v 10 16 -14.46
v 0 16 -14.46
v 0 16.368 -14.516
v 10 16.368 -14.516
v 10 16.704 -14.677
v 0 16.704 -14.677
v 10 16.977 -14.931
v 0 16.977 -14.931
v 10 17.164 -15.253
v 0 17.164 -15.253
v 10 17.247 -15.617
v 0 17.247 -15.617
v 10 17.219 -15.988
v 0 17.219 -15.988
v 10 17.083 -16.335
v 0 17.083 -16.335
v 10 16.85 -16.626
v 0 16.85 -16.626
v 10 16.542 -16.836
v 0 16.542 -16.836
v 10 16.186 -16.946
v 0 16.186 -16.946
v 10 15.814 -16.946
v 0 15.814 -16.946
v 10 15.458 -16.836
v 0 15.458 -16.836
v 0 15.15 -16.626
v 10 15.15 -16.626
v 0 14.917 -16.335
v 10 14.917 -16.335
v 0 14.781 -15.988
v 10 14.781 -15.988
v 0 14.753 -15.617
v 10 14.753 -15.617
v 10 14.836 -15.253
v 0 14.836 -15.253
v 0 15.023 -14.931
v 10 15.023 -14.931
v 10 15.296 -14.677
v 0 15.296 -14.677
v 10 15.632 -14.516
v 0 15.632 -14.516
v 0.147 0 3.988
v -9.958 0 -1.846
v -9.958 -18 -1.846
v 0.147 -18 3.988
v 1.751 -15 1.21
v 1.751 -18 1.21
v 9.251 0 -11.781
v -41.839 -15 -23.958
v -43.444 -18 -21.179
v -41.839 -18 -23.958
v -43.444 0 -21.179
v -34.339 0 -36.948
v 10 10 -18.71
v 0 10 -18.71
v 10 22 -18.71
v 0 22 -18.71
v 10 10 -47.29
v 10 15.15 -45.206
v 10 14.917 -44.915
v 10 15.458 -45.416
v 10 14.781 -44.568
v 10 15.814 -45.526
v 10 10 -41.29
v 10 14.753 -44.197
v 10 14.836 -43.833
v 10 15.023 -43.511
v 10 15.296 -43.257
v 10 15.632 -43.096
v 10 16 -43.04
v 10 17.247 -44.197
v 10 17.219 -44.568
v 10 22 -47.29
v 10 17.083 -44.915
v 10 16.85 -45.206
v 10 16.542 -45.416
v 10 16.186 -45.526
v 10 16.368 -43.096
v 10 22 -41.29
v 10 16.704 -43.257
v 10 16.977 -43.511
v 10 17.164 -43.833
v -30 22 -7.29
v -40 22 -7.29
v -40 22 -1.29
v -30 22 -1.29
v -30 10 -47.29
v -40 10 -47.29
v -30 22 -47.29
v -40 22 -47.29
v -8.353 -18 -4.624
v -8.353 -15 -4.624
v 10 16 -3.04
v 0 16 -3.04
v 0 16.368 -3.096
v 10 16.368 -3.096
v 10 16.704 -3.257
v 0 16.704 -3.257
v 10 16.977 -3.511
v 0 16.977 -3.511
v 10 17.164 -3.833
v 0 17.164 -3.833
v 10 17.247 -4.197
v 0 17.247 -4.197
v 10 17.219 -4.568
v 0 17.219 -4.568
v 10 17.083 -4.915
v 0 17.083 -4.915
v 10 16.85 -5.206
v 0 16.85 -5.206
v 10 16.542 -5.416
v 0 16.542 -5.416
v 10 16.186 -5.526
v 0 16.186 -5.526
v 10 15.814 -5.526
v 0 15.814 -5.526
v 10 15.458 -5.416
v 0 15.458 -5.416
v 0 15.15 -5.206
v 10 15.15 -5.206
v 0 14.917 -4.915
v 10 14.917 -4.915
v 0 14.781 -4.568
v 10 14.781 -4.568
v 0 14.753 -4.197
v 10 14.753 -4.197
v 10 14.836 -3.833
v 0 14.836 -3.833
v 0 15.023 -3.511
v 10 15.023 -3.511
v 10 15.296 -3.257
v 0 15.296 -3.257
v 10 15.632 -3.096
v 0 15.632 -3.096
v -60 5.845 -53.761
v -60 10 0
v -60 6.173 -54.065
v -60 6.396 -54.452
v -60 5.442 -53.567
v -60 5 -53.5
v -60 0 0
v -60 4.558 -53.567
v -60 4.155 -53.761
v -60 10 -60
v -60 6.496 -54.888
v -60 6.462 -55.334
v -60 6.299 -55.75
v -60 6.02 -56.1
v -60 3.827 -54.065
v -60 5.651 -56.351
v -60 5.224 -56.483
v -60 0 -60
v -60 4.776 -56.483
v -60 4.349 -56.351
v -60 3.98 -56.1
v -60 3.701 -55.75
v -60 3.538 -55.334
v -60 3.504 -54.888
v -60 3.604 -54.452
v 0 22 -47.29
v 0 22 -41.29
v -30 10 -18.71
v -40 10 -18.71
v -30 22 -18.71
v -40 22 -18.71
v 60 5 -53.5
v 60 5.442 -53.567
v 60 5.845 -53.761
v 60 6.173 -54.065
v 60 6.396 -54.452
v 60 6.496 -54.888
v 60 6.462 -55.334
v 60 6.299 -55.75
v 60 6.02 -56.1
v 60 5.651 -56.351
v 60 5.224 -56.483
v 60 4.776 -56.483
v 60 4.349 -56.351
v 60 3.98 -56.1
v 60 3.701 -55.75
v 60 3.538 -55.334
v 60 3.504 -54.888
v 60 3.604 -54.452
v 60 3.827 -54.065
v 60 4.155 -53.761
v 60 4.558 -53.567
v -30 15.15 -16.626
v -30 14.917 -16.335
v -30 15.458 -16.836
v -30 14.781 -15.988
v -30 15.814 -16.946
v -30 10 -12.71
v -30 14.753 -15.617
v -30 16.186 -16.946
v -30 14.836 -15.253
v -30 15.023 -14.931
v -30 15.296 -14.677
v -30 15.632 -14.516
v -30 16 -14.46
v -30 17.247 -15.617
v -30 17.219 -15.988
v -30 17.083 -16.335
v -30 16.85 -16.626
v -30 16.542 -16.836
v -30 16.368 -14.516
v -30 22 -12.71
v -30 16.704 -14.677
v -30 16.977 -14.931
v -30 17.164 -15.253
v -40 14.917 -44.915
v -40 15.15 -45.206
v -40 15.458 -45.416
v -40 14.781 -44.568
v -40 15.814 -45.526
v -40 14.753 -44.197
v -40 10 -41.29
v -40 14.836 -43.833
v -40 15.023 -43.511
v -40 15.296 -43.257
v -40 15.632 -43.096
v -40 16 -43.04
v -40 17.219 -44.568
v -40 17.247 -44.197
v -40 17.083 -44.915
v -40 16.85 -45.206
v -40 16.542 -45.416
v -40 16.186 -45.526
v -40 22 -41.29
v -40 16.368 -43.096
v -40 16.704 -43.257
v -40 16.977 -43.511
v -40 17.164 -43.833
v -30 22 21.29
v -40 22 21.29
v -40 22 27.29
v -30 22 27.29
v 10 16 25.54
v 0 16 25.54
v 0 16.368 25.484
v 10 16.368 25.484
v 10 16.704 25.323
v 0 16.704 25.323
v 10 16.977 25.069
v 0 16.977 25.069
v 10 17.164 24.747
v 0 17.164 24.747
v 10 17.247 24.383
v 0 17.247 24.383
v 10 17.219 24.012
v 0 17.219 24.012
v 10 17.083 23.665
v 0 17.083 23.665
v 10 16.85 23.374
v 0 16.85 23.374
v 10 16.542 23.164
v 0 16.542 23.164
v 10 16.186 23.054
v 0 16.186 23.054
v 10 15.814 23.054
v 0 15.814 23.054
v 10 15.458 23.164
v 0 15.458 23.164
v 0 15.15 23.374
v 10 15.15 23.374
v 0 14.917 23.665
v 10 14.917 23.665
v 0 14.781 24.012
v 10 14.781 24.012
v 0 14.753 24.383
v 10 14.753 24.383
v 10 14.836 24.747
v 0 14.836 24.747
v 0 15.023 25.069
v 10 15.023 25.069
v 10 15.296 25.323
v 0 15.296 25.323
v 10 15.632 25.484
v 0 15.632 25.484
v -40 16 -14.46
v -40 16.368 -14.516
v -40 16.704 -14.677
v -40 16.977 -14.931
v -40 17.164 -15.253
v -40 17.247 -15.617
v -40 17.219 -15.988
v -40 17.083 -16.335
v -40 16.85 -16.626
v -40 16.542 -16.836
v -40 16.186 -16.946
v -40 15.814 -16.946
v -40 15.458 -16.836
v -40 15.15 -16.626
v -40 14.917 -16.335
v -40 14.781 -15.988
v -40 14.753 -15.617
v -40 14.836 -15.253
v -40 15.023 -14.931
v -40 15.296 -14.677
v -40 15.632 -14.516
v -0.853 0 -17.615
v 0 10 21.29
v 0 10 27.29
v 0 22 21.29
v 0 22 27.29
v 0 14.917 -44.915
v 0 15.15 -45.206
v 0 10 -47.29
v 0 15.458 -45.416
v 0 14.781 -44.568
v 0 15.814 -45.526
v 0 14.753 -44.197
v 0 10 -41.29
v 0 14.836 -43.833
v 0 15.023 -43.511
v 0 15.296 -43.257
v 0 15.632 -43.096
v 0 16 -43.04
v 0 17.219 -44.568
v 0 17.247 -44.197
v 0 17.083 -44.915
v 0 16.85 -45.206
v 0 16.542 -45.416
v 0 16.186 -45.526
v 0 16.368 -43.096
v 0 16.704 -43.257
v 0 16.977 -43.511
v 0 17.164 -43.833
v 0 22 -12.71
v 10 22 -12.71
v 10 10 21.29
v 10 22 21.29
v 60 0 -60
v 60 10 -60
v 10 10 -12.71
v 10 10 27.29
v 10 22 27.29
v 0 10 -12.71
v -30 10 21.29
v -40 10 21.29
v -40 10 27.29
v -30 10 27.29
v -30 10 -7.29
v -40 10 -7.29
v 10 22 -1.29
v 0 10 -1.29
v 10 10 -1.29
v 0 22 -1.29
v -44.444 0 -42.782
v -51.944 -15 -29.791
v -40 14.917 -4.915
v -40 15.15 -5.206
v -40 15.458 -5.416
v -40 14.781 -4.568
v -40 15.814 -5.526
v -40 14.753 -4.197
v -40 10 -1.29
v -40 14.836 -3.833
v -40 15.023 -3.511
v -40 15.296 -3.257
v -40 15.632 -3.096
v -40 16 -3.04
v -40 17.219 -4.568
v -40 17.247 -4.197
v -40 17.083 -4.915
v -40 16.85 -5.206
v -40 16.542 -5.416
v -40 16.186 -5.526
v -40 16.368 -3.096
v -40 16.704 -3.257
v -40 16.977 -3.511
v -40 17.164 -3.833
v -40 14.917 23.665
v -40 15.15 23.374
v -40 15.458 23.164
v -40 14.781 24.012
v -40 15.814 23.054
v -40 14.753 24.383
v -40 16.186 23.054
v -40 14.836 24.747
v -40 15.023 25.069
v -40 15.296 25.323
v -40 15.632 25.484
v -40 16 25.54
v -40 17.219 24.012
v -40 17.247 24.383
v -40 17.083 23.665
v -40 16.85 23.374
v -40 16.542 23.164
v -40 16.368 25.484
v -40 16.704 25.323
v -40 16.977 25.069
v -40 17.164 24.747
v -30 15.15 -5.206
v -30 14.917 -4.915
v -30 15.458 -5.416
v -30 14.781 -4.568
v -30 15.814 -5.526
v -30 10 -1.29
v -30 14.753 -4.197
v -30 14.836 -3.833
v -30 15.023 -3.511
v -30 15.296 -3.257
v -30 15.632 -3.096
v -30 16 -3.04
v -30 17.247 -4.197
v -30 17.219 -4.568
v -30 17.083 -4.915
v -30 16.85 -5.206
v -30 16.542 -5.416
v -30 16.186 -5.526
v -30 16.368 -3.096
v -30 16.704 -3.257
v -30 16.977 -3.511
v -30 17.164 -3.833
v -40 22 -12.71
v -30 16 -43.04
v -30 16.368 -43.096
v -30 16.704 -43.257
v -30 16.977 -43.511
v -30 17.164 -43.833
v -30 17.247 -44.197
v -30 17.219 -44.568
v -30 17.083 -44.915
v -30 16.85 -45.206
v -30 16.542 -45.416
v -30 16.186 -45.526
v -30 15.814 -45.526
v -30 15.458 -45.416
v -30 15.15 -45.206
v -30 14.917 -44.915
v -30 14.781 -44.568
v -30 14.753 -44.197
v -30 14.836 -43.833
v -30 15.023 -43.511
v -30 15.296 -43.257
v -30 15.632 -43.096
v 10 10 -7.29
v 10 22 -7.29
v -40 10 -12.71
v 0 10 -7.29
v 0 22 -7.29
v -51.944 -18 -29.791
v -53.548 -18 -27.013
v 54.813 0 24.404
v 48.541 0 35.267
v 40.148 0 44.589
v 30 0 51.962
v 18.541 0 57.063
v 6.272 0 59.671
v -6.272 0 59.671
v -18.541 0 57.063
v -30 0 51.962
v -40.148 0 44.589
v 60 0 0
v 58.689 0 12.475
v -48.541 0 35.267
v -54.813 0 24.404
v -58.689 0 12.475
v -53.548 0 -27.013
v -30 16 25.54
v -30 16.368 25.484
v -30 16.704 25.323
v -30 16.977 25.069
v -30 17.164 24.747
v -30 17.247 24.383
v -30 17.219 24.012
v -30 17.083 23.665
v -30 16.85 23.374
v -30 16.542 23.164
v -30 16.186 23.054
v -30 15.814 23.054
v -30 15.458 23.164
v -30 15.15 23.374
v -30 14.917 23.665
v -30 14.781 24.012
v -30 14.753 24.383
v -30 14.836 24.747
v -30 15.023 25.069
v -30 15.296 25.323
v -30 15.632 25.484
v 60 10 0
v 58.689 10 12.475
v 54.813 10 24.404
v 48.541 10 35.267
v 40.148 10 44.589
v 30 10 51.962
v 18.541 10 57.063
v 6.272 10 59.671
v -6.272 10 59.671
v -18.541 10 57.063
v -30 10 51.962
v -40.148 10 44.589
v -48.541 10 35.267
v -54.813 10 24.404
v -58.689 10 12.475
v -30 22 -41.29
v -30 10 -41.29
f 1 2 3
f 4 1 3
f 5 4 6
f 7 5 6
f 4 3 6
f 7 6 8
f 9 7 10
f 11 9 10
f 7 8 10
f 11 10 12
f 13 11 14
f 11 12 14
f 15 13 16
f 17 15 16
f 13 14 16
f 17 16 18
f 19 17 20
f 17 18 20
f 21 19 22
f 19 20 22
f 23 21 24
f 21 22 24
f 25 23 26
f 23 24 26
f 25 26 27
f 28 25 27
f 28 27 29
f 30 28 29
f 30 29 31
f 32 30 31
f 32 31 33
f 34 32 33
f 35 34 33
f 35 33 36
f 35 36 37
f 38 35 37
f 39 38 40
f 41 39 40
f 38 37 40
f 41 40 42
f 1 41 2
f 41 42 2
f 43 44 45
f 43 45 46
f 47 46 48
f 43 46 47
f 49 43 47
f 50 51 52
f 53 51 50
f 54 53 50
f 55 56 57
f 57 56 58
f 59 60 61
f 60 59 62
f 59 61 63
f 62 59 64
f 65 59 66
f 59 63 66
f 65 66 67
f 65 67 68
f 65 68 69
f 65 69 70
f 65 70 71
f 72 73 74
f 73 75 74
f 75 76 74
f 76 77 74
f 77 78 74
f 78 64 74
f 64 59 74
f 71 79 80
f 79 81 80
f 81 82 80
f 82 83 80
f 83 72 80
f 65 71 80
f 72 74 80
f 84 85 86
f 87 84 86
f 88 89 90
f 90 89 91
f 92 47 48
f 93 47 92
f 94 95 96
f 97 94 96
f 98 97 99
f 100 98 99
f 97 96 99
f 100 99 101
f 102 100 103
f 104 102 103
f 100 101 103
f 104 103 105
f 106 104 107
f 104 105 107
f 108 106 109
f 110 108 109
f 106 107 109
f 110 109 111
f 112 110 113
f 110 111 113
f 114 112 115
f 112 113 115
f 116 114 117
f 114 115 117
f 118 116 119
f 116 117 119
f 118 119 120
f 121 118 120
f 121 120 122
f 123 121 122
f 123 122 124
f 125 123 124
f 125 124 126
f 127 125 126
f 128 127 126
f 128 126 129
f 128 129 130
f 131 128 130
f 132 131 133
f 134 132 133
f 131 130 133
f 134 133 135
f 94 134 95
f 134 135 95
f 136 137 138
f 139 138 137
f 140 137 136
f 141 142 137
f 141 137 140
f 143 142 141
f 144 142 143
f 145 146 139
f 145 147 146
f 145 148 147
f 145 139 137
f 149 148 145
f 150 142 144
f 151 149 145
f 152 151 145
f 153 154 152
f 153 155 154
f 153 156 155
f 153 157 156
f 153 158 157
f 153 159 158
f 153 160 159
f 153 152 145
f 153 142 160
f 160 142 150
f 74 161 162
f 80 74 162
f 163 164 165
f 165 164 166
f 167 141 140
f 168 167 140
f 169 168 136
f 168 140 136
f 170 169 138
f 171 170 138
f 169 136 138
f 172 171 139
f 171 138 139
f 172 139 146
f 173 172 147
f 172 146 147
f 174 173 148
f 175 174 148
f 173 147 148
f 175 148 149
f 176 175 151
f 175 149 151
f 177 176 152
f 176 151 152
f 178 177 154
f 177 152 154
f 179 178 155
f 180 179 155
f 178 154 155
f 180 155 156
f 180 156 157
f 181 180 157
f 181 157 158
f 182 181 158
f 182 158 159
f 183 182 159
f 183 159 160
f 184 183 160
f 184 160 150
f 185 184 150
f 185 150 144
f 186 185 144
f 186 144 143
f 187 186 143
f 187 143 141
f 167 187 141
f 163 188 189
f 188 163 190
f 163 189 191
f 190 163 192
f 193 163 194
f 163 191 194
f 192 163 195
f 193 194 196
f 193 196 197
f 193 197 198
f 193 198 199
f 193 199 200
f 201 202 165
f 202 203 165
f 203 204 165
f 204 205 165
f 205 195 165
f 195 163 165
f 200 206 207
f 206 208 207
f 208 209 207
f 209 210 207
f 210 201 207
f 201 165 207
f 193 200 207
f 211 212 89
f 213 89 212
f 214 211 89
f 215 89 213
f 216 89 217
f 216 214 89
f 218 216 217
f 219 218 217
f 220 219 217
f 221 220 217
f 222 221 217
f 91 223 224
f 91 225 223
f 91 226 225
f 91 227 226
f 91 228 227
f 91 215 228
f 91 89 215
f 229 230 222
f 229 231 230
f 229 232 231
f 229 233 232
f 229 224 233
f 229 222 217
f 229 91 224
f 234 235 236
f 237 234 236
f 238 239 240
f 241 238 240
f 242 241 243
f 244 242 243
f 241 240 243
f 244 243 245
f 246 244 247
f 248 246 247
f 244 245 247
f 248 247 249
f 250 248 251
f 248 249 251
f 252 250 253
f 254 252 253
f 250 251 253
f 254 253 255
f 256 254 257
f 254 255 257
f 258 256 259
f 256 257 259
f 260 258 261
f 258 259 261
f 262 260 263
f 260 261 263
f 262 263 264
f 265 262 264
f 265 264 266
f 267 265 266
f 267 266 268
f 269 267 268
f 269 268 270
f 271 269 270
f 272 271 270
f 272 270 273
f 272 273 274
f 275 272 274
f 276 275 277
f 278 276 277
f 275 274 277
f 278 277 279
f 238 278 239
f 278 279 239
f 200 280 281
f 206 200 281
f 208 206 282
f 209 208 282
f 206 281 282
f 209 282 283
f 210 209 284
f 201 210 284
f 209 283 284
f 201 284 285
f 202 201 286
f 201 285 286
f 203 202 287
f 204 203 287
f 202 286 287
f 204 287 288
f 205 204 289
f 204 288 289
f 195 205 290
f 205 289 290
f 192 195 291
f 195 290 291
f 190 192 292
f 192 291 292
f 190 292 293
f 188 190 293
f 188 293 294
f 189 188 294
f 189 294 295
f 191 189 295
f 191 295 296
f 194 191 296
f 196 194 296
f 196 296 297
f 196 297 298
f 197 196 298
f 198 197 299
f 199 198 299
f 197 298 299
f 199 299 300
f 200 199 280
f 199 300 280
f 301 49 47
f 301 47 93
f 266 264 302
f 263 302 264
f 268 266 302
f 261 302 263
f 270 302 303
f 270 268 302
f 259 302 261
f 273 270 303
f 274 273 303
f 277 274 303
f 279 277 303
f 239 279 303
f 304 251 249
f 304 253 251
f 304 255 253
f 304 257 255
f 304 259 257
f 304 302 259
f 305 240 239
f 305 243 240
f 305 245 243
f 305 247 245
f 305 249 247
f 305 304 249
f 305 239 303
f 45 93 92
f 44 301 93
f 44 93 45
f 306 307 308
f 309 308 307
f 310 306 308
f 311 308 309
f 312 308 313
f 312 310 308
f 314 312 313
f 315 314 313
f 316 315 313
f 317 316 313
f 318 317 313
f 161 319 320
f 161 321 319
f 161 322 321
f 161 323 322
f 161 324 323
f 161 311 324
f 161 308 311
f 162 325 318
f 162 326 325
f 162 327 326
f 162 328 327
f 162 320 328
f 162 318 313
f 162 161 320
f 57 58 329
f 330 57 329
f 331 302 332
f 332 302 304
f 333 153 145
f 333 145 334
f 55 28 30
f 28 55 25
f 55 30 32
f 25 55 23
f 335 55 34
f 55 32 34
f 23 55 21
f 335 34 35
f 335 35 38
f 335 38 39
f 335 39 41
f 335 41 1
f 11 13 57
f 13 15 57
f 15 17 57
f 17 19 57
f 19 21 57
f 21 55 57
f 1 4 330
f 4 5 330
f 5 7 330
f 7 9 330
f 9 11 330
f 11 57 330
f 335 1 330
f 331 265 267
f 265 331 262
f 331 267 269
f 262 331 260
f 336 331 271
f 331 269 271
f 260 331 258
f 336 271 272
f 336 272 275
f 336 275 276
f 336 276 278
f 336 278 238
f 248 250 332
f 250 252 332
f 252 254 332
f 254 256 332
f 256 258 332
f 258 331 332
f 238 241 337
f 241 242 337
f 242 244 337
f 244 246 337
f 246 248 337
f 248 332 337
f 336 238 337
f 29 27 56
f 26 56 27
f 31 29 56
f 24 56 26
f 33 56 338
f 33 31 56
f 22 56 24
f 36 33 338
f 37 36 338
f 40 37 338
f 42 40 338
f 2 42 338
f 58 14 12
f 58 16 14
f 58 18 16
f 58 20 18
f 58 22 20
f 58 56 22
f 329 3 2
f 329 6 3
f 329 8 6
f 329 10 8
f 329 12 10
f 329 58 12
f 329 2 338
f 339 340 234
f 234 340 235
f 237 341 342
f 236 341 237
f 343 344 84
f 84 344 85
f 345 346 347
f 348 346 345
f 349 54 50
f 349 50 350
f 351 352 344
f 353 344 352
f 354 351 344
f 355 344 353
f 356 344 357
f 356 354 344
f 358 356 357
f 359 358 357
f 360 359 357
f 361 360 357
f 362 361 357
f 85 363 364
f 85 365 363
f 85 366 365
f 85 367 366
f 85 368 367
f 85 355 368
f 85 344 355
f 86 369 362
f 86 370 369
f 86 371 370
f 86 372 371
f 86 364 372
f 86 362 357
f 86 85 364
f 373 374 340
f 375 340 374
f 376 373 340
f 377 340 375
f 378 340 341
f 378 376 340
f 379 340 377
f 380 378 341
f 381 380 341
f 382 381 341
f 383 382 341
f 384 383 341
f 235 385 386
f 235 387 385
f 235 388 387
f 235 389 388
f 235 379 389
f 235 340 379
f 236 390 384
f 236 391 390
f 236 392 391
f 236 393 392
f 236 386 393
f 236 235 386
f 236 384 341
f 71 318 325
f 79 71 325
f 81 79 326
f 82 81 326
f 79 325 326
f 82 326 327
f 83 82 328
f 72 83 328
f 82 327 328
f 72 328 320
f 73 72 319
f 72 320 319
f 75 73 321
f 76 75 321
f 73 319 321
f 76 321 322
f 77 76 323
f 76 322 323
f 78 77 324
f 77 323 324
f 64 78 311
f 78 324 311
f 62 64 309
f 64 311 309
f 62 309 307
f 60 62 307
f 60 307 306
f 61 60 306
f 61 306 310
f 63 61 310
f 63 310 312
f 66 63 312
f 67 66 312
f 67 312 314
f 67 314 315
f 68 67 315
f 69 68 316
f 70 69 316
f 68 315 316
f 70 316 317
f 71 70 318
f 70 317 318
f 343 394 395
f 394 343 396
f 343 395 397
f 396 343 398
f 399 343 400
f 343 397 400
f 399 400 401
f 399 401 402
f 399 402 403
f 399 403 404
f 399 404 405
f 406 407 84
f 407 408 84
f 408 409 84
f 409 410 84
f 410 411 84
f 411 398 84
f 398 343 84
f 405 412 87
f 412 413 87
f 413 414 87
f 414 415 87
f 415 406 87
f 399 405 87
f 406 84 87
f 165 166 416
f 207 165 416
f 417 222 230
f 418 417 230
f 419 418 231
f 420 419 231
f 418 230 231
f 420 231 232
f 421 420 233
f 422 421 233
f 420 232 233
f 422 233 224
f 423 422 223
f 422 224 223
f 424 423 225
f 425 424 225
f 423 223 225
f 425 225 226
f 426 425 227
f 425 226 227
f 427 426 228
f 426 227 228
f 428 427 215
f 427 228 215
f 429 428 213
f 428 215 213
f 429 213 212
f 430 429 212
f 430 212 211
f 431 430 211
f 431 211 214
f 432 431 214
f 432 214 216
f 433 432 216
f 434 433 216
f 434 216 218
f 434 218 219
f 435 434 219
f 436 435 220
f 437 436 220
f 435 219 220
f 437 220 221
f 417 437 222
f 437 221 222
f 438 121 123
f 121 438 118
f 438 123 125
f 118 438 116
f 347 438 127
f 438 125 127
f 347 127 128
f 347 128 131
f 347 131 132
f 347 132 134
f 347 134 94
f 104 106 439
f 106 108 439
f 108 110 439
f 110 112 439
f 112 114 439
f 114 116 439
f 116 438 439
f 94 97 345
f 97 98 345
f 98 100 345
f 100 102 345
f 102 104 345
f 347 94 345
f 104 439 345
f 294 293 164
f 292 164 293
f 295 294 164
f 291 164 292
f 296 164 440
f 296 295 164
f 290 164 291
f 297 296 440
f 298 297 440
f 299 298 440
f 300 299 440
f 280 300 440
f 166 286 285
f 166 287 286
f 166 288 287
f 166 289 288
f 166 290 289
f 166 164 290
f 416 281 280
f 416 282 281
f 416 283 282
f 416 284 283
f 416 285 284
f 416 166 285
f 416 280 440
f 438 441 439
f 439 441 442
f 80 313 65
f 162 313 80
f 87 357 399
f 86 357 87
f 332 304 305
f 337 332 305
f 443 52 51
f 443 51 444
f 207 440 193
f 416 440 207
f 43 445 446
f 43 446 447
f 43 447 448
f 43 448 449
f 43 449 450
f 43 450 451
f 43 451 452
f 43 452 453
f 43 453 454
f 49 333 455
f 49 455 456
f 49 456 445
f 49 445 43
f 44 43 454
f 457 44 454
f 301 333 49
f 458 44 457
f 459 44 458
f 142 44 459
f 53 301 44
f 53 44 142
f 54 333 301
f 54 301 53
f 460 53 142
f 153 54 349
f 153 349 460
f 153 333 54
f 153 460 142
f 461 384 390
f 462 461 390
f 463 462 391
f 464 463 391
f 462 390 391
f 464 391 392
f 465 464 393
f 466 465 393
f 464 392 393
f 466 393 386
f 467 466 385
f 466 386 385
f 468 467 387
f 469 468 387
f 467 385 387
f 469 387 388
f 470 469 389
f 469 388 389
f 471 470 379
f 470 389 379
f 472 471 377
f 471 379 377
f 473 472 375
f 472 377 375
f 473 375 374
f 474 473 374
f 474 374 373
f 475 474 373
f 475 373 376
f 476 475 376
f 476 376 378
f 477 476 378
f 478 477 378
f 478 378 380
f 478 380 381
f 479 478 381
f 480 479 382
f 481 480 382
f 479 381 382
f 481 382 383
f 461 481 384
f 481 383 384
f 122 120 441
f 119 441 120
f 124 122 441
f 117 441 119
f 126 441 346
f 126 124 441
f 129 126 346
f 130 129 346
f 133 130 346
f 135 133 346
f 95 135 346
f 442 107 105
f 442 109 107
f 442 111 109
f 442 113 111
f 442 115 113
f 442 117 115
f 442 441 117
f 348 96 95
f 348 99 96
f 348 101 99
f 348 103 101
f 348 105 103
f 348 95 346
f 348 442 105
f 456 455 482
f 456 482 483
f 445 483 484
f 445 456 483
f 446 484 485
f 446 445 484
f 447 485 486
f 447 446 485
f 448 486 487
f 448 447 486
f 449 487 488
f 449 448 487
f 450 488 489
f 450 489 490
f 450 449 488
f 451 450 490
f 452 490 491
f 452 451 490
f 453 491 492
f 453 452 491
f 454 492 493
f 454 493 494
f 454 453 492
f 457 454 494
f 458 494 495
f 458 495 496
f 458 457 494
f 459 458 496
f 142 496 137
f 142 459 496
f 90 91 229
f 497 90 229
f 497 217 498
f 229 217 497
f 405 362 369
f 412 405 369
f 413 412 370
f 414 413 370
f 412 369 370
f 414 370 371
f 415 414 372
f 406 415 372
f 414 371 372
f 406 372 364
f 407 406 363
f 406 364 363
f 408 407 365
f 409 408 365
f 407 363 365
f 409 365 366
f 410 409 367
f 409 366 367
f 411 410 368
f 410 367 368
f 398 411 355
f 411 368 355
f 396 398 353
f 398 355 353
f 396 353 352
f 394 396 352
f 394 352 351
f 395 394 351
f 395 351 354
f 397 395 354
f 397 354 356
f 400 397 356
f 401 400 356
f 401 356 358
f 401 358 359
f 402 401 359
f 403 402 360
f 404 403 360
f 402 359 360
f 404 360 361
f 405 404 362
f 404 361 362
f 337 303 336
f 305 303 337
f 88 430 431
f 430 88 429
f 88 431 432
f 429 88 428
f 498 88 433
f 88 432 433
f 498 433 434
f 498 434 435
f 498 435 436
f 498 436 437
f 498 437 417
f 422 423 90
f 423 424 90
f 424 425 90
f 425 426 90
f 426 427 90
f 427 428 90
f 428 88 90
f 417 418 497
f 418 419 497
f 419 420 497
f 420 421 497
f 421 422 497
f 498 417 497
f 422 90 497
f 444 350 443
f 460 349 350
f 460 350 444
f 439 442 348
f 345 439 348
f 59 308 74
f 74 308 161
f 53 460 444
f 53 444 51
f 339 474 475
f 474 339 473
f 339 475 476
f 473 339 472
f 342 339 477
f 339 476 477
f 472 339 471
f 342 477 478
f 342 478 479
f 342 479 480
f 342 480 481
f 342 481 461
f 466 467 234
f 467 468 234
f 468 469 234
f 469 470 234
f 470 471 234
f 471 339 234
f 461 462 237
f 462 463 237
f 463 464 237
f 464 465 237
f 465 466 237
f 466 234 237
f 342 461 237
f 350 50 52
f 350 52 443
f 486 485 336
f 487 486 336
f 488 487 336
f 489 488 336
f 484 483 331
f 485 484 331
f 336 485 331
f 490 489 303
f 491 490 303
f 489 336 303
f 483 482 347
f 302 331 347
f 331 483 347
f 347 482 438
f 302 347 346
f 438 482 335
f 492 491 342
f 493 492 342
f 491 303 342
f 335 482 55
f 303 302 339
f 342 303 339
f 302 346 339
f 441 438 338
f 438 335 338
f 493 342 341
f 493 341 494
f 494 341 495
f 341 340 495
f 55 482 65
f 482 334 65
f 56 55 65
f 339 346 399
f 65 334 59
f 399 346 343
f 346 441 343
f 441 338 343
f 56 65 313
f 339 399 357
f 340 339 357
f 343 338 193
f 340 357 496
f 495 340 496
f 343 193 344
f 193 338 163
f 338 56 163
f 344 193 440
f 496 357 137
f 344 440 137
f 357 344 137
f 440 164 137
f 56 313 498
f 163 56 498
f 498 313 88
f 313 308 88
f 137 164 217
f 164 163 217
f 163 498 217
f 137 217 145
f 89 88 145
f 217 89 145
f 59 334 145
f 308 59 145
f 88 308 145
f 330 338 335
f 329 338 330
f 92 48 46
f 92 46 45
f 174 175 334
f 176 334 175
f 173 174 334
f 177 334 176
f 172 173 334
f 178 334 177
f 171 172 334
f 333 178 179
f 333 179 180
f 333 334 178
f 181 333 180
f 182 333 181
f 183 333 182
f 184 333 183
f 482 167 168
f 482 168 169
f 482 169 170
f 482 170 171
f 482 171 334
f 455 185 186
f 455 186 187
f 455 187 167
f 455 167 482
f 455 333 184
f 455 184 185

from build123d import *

# Parameters (mm, degrees)
BOSS_EXTRUDE1_DEPTH     = 10
SKETCH2_R               = 1.5
CUT_EXTRUDE1_DEPTH      = 1
CUT_EXTRUDE1_DEPTH_BACK = 121
BOSS_EXTRUDE2_START     = -20
SKETCH5_W               = 6
SKETCH5_H               = 12
SKETCH5_R               = 1.25
BOSS_EXTRUDE2_DEPTH     = 10
LPATTERN1_COUNT         = 2
LPATTERN1_PITCH         = 40
LPATTERN1_COUNT_DIR2    = 2
LPATTERN1_PITCH_DIR2    = 40
BOSS_EXTRUDE4_DEPTH     = 18
CHAMFER1_SIZE           = 15


with BuildPart() as part:
    # Sketch1 → Boss-Extrude1 (new body)
    with BuildSketch(Plane(origin=(0, 0, 0), x_dir=(1, 0, 0), z_dir=(0, 1, 0))):
        with BuildLine():
            Line((-60, 0), (-60, 60))
            Line((-60, 60), (60, 60))
            Line((60, 60), (60, 0))
            ThreePointArc((60, 0), (0, -60), (-60, 0))
        make_face()
    extrude(amount=BOSS_EXTRUDE1_DEPTH)

    # Sketch2 → Cut-Extrude1 (cut, two sides)
    with BuildSketch(Plane.ZY.offset(60)) as cut_extrude1_sk:
        with Locations((-55, 5)):
            Circle(SKETCH2_R)
    extrude(amount=CUT_EXTRUDE1_DEPTH, mode=Mode.SUBTRACT)
    extrude(cut_extrude1_sk.sketch, amount=-CUT_EXTRUDE1_DEPTH_BACK, mode=Mode.SUBTRACT)

    # Sketch5 → Boss-Extrude2 (add)
    with BuildSketch(Plane.ZY.offset(60).offset(BOSS_EXTRUDE2_START)):
        with Locations((-44.29, 16)):
            Rectangle(SKETCH5_W, SKETCH5_H)
        with Locations((-44.29, 16)):
            Circle(SKETCH5_R, mode=Mode.SUBTRACT)
        with Locations((-15.71, 16)):
            Rectangle(SKETCH5_W, SKETCH5_H)
        with Locations((-15.71, 16)):
            Circle(SKETCH5_R, mode=Mode.SUBTRACT)
    boss_extrude2 = extrude(amount=-BOSS_EXTRUDE2_DEPTH)

    # LPattern1: Boss-Extrude2 2 × 2
    with Locations(*[(i * LPATTERN1_PITCH, 0, j * LPATTERN1_PITCH_DIR2) for i in range(LPATTERN1_COUNT) for j in range(LPATTERN1_COUNT_DIR2) if (i, j) != (0, 0)]):
        add(boss_extrude2)

    # Sketch9 → Boss-Extrude4 (add)
    with BuildSketch(Plane.XZ):
        Polygon((-53.548293043, -27.012784213), (-43.443719976, -21.178906233), (-41.83944897, -23.957585125), (-51.944022036, -29.791463105), align=None)
        Polygon((-9.957561883, -1.845663844), (0.147011183, 3.988214136), (1.75128219, 1.209535244), (-8.353290877, -4.624342736), align=None)
    extrude(amount=BOSS_EXTRUDE4_DEPTH)

    # Chamfer1
    chamfer1_edges = [part.edges().sort_by_distance(p)[0] for p in [
        (-46.891735503, 0, -26.874524115),
        (-3.301004344, 0, -1.707403746),
    ]]
    chamfer(chamfer1_edges, length=CHAMFER1_SIZE)


solid = part.part
